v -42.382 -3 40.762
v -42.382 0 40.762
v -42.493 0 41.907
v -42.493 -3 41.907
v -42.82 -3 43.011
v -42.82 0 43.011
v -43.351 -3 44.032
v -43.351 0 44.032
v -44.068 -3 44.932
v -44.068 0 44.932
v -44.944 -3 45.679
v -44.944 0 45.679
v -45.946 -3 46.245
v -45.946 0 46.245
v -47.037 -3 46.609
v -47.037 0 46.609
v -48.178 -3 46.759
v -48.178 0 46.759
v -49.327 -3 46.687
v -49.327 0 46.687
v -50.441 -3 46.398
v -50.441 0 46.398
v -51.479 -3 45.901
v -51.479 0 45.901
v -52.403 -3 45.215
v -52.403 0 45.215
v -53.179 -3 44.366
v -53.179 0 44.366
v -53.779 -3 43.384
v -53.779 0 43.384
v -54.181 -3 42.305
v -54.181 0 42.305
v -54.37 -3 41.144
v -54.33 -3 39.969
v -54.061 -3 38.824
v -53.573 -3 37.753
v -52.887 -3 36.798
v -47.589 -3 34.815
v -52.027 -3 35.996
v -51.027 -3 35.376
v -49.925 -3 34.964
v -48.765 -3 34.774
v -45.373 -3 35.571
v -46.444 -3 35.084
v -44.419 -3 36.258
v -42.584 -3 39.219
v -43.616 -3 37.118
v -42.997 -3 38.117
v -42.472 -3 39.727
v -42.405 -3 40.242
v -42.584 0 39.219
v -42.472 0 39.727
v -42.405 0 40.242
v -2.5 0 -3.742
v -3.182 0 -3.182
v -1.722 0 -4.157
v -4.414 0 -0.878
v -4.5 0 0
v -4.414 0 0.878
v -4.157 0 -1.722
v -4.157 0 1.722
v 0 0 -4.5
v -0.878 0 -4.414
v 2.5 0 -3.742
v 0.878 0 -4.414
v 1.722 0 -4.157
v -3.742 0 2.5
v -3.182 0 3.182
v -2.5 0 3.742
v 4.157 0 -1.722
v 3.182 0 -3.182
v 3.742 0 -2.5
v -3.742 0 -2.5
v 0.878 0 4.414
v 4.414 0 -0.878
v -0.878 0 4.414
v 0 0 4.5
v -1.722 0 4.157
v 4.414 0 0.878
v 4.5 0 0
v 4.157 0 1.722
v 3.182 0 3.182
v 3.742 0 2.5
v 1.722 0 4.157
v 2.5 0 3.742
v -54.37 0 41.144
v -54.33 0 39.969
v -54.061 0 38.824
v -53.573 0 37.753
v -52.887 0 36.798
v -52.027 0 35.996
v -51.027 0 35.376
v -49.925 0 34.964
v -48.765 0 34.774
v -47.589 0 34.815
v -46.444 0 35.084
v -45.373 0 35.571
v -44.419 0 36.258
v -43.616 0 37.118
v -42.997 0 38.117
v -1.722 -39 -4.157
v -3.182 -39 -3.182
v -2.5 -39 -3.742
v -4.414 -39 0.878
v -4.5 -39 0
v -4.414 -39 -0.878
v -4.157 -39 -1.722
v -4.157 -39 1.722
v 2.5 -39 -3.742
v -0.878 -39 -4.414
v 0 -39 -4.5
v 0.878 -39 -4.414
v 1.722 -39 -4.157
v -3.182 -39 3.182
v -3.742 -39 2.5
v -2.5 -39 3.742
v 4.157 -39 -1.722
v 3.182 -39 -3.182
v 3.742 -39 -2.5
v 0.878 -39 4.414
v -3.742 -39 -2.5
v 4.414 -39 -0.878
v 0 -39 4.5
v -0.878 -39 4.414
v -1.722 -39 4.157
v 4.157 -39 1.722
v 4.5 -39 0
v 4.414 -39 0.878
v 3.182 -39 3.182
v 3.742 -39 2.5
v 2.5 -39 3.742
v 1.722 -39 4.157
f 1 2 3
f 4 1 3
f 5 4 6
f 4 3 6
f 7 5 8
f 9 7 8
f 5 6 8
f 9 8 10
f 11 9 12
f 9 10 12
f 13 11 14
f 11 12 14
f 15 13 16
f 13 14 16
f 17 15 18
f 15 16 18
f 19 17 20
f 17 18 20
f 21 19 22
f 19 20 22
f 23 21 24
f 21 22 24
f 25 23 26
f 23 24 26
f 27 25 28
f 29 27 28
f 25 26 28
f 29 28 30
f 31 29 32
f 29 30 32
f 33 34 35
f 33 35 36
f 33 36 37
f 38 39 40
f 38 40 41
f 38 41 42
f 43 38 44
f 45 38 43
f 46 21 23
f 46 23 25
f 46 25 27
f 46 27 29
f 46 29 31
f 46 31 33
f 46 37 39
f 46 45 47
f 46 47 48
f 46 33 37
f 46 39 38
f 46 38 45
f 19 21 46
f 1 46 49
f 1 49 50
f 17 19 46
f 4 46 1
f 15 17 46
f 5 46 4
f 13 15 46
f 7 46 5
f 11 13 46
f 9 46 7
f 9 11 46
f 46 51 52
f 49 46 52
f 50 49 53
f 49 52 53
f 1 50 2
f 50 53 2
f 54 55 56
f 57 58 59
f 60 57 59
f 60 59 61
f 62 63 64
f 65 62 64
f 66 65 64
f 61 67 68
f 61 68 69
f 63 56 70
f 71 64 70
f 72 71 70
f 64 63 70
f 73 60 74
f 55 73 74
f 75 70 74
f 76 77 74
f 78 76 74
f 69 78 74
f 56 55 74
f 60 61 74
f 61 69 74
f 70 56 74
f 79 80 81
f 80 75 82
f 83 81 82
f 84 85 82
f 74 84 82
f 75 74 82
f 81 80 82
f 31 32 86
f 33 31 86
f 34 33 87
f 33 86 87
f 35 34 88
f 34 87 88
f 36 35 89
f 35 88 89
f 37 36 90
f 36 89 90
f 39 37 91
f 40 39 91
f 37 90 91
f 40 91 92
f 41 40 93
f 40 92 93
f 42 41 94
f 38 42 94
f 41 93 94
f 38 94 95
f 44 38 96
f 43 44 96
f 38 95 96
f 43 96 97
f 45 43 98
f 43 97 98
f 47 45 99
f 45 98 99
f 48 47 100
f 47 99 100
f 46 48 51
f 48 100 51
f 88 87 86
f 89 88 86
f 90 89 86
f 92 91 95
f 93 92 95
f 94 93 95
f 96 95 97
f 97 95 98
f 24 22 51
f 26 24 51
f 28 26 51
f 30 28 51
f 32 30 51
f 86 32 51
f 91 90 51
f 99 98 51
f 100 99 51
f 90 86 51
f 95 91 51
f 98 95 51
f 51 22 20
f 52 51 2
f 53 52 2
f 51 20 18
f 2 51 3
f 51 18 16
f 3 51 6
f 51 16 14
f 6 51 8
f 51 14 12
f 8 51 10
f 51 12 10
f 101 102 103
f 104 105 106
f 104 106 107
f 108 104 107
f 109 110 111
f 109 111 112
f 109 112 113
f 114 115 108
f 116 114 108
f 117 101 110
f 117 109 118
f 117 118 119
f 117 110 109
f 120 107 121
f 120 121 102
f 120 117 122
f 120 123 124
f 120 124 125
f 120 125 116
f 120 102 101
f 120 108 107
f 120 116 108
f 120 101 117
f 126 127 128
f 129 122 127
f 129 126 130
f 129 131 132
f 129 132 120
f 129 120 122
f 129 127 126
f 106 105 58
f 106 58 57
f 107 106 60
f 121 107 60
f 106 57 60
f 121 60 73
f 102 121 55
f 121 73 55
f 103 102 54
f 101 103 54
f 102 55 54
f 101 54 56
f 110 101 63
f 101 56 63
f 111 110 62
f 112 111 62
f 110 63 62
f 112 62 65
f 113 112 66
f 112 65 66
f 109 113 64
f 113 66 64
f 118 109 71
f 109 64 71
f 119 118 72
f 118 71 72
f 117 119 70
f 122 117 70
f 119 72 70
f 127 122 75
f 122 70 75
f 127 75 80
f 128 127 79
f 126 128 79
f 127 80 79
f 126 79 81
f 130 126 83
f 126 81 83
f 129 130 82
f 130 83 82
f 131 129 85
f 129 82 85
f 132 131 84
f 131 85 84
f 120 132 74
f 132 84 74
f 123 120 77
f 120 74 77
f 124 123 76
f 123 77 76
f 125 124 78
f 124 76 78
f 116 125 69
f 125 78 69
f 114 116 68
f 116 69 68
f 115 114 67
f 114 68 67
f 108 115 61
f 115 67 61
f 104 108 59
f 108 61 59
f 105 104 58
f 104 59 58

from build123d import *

# Parameters (mm, degrees)
F1_DEPTH = 39
F3_DEPTH = 3


with BuildPart() as f1:
    # F0 (on Front) → F1 (new body)
    with BuildSketch(Plane.XZ):
        with BuildLine():
            Line((-4.5, 0), (4.5, 0))
            ThreePointArc((4.5, 0), (0, 4.5), (-4.5, 0))
        make_face()
        with BuildLine():
            ThreePointArc((-4.5, 0), (0, -4.5), (4.5, 0))
            Line((4.5, 0), (-4.5, 0))
        make_face()
    extrude(amount=F1_DEPTH)


with BuildPart() as f3:
    # F2 (on Front) → F3 (new body)
    with BuildSketch(Plane.XZ):
        with BuildLine():
            ThreePointArc((-42.584113, 39.218962), (-42.432976, 39.983898), (-42.382312, 40.761974))
            ThreePointArc((-42.382312, 40.761974), (-47.604236, 46.71131), (-54.180511, 42.304985))
            Line((-54.180511, 42.304985), (-48.382312, 40.761974))
            Line((-48.382312, 40.761974), (-42.584113, 39.218962))
        make_face()
        with BuildLine():
            Line((-48.382312, 40.761974), (-54.180511, 42.304985))
            ThreePointArc((-54.180511, 42.304985), (-49.925324, 34.963774), (-42.584113, 39.218962))
            Line((-42.584113, 39.218962), (-48.382312, 40.761974))
        make_face()
    extrude(amount=F3_DEPTH)


solid = Compound([f1.part, f3.part])
